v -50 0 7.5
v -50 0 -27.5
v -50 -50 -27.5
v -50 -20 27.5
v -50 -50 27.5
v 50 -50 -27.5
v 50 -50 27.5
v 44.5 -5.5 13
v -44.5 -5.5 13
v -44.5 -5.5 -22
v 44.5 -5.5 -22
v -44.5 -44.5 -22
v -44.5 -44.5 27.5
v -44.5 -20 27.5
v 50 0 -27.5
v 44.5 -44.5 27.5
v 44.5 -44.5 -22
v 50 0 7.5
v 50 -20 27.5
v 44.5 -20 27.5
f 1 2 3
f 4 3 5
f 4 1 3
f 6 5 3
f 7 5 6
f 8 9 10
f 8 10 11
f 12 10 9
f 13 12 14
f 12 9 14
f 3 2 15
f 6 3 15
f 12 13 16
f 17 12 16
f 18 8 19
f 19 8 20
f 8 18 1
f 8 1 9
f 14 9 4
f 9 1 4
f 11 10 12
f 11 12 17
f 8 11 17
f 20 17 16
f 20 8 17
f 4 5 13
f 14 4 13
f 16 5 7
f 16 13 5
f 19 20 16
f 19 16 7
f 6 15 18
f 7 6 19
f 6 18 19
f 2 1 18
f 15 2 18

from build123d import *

# Parameters (mm, degrees)
F0_W        = 100
F0_H        = 55
F1_DEPTH    = 50
F2_T        = -5.5
F3_T1_DEPTH = 202.8673195186


# Not quite as in the source:
# - a fillet or chamfer that OpenCascade refuses, or shapes differently, is made with other operations: its cross-section is extruded or revolved along the edge and cut away or added


with BuildPart() as f1:
    # F0 (on Front) → F1 (new body)
    with BuildSketch(Plane.XZ):
        Rectangle(F0_W, F0_H)
    extrude(amount=F1_DEPTH)

    # F2
    f2_openings = [f1.faces().sort_by_distance(p)[0] for p in [
        (0, -25, 27.5),
    ]]
    offset(amount=F2_T, openings=f2_openings)

    # F3: chamfer of 20 on 1 edges, made by hand

    # F3_s2 → F3_t1 (cut)
    with BuildSketch(Plane.YZ.offset(-101.4336597593)):
        Polygon((0, 7.5), (-20, 27.5), (0, 27.5), align=None)
    extrude(amount=F3_T1_DEPTH, mode=Mode.SUBTRACT)


solid = f1.part
